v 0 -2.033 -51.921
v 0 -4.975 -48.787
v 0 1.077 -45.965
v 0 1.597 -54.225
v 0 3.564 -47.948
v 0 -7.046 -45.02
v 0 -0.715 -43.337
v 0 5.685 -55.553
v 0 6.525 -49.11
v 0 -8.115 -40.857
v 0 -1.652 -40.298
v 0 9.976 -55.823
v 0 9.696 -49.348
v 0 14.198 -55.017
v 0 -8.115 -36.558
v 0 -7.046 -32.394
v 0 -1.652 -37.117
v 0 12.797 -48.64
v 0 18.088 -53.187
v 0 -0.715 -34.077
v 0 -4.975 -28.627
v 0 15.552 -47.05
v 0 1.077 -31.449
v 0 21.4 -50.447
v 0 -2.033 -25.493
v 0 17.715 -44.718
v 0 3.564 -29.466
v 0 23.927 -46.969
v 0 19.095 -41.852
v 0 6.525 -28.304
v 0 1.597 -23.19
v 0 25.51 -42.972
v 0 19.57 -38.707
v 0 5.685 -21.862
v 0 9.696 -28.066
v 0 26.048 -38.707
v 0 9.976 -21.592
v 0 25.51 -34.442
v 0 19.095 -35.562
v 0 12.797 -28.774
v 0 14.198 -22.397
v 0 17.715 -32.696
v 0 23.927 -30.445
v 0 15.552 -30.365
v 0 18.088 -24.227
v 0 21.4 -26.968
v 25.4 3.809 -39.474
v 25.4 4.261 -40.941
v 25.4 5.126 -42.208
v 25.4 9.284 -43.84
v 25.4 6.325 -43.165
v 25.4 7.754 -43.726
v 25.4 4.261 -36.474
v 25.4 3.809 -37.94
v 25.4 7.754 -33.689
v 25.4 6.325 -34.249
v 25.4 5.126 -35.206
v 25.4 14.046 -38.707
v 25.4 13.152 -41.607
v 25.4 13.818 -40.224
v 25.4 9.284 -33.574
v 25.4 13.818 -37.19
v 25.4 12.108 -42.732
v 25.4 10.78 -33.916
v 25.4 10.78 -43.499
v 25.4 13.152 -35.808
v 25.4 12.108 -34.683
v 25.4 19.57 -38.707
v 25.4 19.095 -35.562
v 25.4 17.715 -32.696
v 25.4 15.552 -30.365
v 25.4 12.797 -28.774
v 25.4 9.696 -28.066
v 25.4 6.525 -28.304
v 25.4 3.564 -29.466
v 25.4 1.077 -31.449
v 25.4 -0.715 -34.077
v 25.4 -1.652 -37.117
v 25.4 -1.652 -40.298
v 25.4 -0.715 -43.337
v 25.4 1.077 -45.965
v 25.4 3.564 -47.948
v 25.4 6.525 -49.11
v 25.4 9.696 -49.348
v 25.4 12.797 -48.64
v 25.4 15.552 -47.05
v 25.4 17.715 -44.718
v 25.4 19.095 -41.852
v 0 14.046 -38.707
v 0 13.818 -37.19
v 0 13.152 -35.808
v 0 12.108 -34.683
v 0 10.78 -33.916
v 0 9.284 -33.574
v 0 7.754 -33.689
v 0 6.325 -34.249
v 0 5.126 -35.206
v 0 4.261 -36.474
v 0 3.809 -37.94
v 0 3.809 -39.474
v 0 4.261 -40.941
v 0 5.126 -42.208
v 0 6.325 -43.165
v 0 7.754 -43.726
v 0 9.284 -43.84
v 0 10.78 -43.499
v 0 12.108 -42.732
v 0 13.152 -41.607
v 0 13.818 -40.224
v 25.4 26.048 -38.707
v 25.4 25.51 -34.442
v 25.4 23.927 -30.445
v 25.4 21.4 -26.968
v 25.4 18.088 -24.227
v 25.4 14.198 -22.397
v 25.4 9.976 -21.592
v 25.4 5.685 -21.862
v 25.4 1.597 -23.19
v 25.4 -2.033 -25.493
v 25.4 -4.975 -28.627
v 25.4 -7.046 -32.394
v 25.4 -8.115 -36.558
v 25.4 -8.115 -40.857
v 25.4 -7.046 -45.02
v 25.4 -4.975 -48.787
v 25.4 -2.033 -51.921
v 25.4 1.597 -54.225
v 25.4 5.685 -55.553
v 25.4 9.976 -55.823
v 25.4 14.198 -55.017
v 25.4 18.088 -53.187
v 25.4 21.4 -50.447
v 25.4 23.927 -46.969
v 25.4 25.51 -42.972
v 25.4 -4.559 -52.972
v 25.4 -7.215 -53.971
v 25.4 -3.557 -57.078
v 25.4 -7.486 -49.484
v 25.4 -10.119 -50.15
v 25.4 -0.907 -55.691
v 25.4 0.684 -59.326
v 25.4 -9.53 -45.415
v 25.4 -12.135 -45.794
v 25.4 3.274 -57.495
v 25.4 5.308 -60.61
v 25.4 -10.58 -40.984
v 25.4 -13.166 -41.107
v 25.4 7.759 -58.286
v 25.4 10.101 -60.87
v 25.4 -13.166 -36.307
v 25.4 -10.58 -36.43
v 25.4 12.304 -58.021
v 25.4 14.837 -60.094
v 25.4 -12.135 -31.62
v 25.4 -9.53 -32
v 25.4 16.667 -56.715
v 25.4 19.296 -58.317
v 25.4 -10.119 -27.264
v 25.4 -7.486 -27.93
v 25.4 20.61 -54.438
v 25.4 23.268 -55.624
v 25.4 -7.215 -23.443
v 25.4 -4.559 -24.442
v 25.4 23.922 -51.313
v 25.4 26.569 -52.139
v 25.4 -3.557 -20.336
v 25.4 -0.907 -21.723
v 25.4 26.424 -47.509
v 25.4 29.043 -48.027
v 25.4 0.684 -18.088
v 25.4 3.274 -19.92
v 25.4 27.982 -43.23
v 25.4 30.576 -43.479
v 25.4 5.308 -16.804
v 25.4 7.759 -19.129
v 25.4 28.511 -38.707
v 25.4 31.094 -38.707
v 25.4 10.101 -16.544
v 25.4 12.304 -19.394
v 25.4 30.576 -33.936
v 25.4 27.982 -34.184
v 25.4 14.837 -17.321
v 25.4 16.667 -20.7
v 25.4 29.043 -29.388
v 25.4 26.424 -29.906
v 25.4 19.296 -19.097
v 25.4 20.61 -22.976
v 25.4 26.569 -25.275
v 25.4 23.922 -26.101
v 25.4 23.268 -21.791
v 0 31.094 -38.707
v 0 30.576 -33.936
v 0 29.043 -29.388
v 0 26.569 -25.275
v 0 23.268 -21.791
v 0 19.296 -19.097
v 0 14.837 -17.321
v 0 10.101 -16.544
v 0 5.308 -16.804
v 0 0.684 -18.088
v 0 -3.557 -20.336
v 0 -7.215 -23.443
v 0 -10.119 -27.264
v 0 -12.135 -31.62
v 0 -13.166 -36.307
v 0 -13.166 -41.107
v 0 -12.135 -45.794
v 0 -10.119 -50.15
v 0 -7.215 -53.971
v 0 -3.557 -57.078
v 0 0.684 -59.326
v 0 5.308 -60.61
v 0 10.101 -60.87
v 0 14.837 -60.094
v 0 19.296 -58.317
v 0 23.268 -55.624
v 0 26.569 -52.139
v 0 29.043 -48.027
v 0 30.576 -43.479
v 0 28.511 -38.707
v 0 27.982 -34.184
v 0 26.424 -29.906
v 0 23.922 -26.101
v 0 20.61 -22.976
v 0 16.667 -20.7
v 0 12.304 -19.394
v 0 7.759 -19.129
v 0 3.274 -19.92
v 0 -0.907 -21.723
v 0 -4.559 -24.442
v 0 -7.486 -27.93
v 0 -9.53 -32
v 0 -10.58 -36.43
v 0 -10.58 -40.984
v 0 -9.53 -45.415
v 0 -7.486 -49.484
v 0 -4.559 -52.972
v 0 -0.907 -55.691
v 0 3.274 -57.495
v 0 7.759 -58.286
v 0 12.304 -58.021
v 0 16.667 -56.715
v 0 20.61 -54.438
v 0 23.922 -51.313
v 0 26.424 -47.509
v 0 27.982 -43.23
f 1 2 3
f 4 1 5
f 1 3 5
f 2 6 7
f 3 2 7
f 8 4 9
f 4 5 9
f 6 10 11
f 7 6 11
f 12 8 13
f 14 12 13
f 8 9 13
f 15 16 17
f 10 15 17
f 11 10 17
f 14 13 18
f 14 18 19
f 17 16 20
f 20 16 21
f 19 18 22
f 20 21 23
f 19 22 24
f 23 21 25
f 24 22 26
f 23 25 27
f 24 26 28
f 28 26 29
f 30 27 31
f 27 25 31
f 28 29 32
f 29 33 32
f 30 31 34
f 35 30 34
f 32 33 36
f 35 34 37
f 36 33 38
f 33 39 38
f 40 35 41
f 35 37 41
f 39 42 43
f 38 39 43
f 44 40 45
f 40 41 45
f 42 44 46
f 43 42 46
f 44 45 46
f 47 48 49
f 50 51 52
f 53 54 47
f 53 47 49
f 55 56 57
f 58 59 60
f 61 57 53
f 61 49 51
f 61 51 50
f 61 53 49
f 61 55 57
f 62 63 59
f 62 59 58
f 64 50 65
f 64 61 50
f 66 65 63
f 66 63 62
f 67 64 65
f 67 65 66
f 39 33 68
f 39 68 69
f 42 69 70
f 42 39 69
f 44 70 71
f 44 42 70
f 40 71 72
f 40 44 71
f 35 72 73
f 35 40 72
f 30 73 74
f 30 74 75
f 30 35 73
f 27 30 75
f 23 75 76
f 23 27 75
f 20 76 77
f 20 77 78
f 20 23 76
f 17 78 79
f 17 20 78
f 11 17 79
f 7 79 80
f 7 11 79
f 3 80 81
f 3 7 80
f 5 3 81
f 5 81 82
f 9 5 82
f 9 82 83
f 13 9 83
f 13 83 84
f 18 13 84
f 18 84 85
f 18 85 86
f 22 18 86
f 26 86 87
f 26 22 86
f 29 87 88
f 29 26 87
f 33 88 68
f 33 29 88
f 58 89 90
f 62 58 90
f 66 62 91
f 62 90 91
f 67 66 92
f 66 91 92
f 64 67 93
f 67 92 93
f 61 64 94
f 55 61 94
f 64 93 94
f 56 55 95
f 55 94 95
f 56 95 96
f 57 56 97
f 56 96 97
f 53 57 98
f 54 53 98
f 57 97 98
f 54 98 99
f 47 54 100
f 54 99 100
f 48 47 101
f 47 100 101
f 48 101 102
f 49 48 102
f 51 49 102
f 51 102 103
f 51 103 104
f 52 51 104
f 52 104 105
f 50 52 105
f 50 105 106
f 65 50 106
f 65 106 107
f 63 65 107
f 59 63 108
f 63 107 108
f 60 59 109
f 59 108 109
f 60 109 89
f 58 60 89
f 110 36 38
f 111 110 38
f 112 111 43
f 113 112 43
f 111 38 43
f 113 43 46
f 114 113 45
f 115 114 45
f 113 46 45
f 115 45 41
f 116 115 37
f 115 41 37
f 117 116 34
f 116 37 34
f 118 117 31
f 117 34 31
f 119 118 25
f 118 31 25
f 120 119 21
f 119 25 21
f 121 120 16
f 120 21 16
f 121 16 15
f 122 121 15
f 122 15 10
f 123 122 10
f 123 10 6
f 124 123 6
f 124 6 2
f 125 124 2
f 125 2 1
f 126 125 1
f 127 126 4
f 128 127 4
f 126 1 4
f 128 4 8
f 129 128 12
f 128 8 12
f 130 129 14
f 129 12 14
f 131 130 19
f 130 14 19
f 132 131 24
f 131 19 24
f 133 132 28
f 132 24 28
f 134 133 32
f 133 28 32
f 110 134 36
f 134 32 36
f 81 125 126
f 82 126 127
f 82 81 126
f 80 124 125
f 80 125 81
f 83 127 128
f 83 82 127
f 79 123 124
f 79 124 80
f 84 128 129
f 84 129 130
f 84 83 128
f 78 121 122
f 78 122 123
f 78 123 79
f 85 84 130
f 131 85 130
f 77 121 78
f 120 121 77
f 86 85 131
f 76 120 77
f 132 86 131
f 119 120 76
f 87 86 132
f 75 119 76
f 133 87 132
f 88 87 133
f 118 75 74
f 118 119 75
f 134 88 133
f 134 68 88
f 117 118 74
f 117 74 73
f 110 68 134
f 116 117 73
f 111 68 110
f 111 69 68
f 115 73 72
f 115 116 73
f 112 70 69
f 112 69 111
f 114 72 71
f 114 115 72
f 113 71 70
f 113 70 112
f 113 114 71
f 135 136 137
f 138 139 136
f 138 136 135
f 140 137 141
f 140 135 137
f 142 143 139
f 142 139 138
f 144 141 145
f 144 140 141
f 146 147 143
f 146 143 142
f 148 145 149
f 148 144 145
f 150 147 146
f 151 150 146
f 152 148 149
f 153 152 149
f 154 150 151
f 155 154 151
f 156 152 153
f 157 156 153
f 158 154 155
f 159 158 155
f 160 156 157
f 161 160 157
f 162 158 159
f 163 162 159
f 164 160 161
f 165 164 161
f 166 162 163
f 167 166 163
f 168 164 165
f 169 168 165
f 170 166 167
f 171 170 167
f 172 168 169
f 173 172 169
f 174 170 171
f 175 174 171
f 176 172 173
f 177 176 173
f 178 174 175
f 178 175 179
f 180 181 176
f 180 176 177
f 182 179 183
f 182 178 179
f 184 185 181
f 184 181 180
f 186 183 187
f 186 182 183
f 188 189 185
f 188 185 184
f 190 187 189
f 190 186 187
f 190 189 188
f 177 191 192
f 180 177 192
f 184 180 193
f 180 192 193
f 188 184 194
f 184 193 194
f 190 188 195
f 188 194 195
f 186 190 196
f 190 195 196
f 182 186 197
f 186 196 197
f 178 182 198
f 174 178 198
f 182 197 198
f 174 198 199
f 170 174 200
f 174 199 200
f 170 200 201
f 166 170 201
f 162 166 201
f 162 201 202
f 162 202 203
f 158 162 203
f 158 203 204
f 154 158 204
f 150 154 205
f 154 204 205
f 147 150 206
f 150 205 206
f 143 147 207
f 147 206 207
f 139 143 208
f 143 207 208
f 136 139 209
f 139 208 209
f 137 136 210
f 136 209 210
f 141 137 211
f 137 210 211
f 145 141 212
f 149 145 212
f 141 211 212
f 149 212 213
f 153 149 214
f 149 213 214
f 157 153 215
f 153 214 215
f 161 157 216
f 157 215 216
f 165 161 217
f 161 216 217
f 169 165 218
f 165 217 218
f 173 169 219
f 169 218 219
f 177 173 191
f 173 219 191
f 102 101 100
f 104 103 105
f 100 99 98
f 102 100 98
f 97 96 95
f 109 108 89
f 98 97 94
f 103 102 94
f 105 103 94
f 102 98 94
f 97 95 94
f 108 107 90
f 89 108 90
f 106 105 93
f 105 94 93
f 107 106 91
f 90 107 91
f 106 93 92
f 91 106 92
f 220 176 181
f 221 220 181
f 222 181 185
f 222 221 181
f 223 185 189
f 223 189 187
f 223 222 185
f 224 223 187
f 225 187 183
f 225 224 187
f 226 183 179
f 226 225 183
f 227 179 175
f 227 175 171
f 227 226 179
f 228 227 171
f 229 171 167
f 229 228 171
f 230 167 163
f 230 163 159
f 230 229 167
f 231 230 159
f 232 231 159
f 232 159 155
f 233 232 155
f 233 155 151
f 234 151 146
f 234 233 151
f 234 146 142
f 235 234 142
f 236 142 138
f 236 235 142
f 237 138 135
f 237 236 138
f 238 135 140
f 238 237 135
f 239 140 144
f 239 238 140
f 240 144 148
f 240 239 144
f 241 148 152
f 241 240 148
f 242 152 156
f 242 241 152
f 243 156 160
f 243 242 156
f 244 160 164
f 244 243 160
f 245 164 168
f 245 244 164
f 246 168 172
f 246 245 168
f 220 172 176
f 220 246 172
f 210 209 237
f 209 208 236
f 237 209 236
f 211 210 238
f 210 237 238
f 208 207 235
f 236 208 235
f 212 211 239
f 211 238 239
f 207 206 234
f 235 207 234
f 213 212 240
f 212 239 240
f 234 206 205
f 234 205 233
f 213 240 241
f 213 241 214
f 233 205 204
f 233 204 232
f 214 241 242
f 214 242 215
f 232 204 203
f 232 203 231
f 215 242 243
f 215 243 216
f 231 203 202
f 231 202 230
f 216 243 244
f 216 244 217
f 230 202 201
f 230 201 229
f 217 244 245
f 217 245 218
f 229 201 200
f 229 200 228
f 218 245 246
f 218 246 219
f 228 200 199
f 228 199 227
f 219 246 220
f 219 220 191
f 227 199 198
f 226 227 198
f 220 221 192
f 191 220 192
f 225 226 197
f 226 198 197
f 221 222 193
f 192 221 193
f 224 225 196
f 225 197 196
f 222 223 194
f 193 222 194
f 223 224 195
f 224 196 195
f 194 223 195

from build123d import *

# Parameters (mm, degrees)
F0_R     = 22.195541368
F0_R_2   = 19.6115494273
F1_DEPTH = 25.4
F0_R_3   = 5.1474184814
F0_R_4   = 17.1494750352
F0_R_5   = 14.3453954548
F0_R_6   = 10.6706063554


with BuildPart() as f1:
    # F0 (on Right) → F1 (new body)
    with BuildSketch(Plane.YZ):
        with Locations((8.8989520445, -38.7072153389)):
            Circle(F0_R)
        with Locations((8.8989520445, -38.7072153389)):
            Circle(F0_R_2, mode=Mode.SUBTRACT)
    extrude(amount=F1_DEPTH)


with BuildPart() as f1b:
    # F0 (on Right) → F1, piece 2 (new body)
    with BuildSketch(Plane.YZ):
        with Locations((8.8989520445, -38.7072153389)):
            Circle(F0_R_3)
    extrude(amount=F1_DEPTH)


with BuildPart() as f1c:
    # F0 (on Right) → F1, piece 3 (new body)
    with BuildSketch(Plane.YZ):
        with Locations((8.8989520445, -38.7072153389)):
            Circle(F0_R_4)
        with Locations((8.8989520445, -38.7072153389)):
            Circle(F0_R_5, mode=Mode.SUBTRACT)
        with Locations((8.8989520445, -38.7072153389)):
            Circle(F0_R_5)
        with Locations((8.8989520445, -38.7072153389)):
            Circle(F0_R_6, mode=Mode.SUBTRACT)
    extrude(amount=F1_DEPTH)


solid = Compound([f1.part, f1b.part, f1c.part])
